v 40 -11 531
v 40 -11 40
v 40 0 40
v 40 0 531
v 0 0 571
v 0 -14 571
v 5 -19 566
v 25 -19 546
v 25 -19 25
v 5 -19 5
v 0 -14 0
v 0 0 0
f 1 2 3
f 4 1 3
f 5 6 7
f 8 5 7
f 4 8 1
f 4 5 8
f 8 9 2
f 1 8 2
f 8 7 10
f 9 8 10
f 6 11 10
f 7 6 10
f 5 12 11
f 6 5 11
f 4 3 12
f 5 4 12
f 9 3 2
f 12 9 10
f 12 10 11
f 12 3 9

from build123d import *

# Parameters (mm, degrees)
F1_DEPTH = 571
F3_DEPTH = 25


with BuildPart() as f1:
    # F0 (on Top) → F1 (new body)
    with BuildSketch(Plane.XY):
        Polygon((40, 0), (0, 0), (0, -14), (5, -19), (25, -19), (40, -11), align=None)
    extrude(amount=F1_DEPTH)

    # F2 (on Front) → F3 (cut)
    with BuildSketch(Plane.XZ):
        Polygon((40, 40), (0, 0), (40, 0), align=None)
        Polygon((0, 571), (40, 531), (40, 571), align=None)
    extrude(amount=F3_DEPTH, mode=Mode.SUBTRACT)


solid = f1.part
